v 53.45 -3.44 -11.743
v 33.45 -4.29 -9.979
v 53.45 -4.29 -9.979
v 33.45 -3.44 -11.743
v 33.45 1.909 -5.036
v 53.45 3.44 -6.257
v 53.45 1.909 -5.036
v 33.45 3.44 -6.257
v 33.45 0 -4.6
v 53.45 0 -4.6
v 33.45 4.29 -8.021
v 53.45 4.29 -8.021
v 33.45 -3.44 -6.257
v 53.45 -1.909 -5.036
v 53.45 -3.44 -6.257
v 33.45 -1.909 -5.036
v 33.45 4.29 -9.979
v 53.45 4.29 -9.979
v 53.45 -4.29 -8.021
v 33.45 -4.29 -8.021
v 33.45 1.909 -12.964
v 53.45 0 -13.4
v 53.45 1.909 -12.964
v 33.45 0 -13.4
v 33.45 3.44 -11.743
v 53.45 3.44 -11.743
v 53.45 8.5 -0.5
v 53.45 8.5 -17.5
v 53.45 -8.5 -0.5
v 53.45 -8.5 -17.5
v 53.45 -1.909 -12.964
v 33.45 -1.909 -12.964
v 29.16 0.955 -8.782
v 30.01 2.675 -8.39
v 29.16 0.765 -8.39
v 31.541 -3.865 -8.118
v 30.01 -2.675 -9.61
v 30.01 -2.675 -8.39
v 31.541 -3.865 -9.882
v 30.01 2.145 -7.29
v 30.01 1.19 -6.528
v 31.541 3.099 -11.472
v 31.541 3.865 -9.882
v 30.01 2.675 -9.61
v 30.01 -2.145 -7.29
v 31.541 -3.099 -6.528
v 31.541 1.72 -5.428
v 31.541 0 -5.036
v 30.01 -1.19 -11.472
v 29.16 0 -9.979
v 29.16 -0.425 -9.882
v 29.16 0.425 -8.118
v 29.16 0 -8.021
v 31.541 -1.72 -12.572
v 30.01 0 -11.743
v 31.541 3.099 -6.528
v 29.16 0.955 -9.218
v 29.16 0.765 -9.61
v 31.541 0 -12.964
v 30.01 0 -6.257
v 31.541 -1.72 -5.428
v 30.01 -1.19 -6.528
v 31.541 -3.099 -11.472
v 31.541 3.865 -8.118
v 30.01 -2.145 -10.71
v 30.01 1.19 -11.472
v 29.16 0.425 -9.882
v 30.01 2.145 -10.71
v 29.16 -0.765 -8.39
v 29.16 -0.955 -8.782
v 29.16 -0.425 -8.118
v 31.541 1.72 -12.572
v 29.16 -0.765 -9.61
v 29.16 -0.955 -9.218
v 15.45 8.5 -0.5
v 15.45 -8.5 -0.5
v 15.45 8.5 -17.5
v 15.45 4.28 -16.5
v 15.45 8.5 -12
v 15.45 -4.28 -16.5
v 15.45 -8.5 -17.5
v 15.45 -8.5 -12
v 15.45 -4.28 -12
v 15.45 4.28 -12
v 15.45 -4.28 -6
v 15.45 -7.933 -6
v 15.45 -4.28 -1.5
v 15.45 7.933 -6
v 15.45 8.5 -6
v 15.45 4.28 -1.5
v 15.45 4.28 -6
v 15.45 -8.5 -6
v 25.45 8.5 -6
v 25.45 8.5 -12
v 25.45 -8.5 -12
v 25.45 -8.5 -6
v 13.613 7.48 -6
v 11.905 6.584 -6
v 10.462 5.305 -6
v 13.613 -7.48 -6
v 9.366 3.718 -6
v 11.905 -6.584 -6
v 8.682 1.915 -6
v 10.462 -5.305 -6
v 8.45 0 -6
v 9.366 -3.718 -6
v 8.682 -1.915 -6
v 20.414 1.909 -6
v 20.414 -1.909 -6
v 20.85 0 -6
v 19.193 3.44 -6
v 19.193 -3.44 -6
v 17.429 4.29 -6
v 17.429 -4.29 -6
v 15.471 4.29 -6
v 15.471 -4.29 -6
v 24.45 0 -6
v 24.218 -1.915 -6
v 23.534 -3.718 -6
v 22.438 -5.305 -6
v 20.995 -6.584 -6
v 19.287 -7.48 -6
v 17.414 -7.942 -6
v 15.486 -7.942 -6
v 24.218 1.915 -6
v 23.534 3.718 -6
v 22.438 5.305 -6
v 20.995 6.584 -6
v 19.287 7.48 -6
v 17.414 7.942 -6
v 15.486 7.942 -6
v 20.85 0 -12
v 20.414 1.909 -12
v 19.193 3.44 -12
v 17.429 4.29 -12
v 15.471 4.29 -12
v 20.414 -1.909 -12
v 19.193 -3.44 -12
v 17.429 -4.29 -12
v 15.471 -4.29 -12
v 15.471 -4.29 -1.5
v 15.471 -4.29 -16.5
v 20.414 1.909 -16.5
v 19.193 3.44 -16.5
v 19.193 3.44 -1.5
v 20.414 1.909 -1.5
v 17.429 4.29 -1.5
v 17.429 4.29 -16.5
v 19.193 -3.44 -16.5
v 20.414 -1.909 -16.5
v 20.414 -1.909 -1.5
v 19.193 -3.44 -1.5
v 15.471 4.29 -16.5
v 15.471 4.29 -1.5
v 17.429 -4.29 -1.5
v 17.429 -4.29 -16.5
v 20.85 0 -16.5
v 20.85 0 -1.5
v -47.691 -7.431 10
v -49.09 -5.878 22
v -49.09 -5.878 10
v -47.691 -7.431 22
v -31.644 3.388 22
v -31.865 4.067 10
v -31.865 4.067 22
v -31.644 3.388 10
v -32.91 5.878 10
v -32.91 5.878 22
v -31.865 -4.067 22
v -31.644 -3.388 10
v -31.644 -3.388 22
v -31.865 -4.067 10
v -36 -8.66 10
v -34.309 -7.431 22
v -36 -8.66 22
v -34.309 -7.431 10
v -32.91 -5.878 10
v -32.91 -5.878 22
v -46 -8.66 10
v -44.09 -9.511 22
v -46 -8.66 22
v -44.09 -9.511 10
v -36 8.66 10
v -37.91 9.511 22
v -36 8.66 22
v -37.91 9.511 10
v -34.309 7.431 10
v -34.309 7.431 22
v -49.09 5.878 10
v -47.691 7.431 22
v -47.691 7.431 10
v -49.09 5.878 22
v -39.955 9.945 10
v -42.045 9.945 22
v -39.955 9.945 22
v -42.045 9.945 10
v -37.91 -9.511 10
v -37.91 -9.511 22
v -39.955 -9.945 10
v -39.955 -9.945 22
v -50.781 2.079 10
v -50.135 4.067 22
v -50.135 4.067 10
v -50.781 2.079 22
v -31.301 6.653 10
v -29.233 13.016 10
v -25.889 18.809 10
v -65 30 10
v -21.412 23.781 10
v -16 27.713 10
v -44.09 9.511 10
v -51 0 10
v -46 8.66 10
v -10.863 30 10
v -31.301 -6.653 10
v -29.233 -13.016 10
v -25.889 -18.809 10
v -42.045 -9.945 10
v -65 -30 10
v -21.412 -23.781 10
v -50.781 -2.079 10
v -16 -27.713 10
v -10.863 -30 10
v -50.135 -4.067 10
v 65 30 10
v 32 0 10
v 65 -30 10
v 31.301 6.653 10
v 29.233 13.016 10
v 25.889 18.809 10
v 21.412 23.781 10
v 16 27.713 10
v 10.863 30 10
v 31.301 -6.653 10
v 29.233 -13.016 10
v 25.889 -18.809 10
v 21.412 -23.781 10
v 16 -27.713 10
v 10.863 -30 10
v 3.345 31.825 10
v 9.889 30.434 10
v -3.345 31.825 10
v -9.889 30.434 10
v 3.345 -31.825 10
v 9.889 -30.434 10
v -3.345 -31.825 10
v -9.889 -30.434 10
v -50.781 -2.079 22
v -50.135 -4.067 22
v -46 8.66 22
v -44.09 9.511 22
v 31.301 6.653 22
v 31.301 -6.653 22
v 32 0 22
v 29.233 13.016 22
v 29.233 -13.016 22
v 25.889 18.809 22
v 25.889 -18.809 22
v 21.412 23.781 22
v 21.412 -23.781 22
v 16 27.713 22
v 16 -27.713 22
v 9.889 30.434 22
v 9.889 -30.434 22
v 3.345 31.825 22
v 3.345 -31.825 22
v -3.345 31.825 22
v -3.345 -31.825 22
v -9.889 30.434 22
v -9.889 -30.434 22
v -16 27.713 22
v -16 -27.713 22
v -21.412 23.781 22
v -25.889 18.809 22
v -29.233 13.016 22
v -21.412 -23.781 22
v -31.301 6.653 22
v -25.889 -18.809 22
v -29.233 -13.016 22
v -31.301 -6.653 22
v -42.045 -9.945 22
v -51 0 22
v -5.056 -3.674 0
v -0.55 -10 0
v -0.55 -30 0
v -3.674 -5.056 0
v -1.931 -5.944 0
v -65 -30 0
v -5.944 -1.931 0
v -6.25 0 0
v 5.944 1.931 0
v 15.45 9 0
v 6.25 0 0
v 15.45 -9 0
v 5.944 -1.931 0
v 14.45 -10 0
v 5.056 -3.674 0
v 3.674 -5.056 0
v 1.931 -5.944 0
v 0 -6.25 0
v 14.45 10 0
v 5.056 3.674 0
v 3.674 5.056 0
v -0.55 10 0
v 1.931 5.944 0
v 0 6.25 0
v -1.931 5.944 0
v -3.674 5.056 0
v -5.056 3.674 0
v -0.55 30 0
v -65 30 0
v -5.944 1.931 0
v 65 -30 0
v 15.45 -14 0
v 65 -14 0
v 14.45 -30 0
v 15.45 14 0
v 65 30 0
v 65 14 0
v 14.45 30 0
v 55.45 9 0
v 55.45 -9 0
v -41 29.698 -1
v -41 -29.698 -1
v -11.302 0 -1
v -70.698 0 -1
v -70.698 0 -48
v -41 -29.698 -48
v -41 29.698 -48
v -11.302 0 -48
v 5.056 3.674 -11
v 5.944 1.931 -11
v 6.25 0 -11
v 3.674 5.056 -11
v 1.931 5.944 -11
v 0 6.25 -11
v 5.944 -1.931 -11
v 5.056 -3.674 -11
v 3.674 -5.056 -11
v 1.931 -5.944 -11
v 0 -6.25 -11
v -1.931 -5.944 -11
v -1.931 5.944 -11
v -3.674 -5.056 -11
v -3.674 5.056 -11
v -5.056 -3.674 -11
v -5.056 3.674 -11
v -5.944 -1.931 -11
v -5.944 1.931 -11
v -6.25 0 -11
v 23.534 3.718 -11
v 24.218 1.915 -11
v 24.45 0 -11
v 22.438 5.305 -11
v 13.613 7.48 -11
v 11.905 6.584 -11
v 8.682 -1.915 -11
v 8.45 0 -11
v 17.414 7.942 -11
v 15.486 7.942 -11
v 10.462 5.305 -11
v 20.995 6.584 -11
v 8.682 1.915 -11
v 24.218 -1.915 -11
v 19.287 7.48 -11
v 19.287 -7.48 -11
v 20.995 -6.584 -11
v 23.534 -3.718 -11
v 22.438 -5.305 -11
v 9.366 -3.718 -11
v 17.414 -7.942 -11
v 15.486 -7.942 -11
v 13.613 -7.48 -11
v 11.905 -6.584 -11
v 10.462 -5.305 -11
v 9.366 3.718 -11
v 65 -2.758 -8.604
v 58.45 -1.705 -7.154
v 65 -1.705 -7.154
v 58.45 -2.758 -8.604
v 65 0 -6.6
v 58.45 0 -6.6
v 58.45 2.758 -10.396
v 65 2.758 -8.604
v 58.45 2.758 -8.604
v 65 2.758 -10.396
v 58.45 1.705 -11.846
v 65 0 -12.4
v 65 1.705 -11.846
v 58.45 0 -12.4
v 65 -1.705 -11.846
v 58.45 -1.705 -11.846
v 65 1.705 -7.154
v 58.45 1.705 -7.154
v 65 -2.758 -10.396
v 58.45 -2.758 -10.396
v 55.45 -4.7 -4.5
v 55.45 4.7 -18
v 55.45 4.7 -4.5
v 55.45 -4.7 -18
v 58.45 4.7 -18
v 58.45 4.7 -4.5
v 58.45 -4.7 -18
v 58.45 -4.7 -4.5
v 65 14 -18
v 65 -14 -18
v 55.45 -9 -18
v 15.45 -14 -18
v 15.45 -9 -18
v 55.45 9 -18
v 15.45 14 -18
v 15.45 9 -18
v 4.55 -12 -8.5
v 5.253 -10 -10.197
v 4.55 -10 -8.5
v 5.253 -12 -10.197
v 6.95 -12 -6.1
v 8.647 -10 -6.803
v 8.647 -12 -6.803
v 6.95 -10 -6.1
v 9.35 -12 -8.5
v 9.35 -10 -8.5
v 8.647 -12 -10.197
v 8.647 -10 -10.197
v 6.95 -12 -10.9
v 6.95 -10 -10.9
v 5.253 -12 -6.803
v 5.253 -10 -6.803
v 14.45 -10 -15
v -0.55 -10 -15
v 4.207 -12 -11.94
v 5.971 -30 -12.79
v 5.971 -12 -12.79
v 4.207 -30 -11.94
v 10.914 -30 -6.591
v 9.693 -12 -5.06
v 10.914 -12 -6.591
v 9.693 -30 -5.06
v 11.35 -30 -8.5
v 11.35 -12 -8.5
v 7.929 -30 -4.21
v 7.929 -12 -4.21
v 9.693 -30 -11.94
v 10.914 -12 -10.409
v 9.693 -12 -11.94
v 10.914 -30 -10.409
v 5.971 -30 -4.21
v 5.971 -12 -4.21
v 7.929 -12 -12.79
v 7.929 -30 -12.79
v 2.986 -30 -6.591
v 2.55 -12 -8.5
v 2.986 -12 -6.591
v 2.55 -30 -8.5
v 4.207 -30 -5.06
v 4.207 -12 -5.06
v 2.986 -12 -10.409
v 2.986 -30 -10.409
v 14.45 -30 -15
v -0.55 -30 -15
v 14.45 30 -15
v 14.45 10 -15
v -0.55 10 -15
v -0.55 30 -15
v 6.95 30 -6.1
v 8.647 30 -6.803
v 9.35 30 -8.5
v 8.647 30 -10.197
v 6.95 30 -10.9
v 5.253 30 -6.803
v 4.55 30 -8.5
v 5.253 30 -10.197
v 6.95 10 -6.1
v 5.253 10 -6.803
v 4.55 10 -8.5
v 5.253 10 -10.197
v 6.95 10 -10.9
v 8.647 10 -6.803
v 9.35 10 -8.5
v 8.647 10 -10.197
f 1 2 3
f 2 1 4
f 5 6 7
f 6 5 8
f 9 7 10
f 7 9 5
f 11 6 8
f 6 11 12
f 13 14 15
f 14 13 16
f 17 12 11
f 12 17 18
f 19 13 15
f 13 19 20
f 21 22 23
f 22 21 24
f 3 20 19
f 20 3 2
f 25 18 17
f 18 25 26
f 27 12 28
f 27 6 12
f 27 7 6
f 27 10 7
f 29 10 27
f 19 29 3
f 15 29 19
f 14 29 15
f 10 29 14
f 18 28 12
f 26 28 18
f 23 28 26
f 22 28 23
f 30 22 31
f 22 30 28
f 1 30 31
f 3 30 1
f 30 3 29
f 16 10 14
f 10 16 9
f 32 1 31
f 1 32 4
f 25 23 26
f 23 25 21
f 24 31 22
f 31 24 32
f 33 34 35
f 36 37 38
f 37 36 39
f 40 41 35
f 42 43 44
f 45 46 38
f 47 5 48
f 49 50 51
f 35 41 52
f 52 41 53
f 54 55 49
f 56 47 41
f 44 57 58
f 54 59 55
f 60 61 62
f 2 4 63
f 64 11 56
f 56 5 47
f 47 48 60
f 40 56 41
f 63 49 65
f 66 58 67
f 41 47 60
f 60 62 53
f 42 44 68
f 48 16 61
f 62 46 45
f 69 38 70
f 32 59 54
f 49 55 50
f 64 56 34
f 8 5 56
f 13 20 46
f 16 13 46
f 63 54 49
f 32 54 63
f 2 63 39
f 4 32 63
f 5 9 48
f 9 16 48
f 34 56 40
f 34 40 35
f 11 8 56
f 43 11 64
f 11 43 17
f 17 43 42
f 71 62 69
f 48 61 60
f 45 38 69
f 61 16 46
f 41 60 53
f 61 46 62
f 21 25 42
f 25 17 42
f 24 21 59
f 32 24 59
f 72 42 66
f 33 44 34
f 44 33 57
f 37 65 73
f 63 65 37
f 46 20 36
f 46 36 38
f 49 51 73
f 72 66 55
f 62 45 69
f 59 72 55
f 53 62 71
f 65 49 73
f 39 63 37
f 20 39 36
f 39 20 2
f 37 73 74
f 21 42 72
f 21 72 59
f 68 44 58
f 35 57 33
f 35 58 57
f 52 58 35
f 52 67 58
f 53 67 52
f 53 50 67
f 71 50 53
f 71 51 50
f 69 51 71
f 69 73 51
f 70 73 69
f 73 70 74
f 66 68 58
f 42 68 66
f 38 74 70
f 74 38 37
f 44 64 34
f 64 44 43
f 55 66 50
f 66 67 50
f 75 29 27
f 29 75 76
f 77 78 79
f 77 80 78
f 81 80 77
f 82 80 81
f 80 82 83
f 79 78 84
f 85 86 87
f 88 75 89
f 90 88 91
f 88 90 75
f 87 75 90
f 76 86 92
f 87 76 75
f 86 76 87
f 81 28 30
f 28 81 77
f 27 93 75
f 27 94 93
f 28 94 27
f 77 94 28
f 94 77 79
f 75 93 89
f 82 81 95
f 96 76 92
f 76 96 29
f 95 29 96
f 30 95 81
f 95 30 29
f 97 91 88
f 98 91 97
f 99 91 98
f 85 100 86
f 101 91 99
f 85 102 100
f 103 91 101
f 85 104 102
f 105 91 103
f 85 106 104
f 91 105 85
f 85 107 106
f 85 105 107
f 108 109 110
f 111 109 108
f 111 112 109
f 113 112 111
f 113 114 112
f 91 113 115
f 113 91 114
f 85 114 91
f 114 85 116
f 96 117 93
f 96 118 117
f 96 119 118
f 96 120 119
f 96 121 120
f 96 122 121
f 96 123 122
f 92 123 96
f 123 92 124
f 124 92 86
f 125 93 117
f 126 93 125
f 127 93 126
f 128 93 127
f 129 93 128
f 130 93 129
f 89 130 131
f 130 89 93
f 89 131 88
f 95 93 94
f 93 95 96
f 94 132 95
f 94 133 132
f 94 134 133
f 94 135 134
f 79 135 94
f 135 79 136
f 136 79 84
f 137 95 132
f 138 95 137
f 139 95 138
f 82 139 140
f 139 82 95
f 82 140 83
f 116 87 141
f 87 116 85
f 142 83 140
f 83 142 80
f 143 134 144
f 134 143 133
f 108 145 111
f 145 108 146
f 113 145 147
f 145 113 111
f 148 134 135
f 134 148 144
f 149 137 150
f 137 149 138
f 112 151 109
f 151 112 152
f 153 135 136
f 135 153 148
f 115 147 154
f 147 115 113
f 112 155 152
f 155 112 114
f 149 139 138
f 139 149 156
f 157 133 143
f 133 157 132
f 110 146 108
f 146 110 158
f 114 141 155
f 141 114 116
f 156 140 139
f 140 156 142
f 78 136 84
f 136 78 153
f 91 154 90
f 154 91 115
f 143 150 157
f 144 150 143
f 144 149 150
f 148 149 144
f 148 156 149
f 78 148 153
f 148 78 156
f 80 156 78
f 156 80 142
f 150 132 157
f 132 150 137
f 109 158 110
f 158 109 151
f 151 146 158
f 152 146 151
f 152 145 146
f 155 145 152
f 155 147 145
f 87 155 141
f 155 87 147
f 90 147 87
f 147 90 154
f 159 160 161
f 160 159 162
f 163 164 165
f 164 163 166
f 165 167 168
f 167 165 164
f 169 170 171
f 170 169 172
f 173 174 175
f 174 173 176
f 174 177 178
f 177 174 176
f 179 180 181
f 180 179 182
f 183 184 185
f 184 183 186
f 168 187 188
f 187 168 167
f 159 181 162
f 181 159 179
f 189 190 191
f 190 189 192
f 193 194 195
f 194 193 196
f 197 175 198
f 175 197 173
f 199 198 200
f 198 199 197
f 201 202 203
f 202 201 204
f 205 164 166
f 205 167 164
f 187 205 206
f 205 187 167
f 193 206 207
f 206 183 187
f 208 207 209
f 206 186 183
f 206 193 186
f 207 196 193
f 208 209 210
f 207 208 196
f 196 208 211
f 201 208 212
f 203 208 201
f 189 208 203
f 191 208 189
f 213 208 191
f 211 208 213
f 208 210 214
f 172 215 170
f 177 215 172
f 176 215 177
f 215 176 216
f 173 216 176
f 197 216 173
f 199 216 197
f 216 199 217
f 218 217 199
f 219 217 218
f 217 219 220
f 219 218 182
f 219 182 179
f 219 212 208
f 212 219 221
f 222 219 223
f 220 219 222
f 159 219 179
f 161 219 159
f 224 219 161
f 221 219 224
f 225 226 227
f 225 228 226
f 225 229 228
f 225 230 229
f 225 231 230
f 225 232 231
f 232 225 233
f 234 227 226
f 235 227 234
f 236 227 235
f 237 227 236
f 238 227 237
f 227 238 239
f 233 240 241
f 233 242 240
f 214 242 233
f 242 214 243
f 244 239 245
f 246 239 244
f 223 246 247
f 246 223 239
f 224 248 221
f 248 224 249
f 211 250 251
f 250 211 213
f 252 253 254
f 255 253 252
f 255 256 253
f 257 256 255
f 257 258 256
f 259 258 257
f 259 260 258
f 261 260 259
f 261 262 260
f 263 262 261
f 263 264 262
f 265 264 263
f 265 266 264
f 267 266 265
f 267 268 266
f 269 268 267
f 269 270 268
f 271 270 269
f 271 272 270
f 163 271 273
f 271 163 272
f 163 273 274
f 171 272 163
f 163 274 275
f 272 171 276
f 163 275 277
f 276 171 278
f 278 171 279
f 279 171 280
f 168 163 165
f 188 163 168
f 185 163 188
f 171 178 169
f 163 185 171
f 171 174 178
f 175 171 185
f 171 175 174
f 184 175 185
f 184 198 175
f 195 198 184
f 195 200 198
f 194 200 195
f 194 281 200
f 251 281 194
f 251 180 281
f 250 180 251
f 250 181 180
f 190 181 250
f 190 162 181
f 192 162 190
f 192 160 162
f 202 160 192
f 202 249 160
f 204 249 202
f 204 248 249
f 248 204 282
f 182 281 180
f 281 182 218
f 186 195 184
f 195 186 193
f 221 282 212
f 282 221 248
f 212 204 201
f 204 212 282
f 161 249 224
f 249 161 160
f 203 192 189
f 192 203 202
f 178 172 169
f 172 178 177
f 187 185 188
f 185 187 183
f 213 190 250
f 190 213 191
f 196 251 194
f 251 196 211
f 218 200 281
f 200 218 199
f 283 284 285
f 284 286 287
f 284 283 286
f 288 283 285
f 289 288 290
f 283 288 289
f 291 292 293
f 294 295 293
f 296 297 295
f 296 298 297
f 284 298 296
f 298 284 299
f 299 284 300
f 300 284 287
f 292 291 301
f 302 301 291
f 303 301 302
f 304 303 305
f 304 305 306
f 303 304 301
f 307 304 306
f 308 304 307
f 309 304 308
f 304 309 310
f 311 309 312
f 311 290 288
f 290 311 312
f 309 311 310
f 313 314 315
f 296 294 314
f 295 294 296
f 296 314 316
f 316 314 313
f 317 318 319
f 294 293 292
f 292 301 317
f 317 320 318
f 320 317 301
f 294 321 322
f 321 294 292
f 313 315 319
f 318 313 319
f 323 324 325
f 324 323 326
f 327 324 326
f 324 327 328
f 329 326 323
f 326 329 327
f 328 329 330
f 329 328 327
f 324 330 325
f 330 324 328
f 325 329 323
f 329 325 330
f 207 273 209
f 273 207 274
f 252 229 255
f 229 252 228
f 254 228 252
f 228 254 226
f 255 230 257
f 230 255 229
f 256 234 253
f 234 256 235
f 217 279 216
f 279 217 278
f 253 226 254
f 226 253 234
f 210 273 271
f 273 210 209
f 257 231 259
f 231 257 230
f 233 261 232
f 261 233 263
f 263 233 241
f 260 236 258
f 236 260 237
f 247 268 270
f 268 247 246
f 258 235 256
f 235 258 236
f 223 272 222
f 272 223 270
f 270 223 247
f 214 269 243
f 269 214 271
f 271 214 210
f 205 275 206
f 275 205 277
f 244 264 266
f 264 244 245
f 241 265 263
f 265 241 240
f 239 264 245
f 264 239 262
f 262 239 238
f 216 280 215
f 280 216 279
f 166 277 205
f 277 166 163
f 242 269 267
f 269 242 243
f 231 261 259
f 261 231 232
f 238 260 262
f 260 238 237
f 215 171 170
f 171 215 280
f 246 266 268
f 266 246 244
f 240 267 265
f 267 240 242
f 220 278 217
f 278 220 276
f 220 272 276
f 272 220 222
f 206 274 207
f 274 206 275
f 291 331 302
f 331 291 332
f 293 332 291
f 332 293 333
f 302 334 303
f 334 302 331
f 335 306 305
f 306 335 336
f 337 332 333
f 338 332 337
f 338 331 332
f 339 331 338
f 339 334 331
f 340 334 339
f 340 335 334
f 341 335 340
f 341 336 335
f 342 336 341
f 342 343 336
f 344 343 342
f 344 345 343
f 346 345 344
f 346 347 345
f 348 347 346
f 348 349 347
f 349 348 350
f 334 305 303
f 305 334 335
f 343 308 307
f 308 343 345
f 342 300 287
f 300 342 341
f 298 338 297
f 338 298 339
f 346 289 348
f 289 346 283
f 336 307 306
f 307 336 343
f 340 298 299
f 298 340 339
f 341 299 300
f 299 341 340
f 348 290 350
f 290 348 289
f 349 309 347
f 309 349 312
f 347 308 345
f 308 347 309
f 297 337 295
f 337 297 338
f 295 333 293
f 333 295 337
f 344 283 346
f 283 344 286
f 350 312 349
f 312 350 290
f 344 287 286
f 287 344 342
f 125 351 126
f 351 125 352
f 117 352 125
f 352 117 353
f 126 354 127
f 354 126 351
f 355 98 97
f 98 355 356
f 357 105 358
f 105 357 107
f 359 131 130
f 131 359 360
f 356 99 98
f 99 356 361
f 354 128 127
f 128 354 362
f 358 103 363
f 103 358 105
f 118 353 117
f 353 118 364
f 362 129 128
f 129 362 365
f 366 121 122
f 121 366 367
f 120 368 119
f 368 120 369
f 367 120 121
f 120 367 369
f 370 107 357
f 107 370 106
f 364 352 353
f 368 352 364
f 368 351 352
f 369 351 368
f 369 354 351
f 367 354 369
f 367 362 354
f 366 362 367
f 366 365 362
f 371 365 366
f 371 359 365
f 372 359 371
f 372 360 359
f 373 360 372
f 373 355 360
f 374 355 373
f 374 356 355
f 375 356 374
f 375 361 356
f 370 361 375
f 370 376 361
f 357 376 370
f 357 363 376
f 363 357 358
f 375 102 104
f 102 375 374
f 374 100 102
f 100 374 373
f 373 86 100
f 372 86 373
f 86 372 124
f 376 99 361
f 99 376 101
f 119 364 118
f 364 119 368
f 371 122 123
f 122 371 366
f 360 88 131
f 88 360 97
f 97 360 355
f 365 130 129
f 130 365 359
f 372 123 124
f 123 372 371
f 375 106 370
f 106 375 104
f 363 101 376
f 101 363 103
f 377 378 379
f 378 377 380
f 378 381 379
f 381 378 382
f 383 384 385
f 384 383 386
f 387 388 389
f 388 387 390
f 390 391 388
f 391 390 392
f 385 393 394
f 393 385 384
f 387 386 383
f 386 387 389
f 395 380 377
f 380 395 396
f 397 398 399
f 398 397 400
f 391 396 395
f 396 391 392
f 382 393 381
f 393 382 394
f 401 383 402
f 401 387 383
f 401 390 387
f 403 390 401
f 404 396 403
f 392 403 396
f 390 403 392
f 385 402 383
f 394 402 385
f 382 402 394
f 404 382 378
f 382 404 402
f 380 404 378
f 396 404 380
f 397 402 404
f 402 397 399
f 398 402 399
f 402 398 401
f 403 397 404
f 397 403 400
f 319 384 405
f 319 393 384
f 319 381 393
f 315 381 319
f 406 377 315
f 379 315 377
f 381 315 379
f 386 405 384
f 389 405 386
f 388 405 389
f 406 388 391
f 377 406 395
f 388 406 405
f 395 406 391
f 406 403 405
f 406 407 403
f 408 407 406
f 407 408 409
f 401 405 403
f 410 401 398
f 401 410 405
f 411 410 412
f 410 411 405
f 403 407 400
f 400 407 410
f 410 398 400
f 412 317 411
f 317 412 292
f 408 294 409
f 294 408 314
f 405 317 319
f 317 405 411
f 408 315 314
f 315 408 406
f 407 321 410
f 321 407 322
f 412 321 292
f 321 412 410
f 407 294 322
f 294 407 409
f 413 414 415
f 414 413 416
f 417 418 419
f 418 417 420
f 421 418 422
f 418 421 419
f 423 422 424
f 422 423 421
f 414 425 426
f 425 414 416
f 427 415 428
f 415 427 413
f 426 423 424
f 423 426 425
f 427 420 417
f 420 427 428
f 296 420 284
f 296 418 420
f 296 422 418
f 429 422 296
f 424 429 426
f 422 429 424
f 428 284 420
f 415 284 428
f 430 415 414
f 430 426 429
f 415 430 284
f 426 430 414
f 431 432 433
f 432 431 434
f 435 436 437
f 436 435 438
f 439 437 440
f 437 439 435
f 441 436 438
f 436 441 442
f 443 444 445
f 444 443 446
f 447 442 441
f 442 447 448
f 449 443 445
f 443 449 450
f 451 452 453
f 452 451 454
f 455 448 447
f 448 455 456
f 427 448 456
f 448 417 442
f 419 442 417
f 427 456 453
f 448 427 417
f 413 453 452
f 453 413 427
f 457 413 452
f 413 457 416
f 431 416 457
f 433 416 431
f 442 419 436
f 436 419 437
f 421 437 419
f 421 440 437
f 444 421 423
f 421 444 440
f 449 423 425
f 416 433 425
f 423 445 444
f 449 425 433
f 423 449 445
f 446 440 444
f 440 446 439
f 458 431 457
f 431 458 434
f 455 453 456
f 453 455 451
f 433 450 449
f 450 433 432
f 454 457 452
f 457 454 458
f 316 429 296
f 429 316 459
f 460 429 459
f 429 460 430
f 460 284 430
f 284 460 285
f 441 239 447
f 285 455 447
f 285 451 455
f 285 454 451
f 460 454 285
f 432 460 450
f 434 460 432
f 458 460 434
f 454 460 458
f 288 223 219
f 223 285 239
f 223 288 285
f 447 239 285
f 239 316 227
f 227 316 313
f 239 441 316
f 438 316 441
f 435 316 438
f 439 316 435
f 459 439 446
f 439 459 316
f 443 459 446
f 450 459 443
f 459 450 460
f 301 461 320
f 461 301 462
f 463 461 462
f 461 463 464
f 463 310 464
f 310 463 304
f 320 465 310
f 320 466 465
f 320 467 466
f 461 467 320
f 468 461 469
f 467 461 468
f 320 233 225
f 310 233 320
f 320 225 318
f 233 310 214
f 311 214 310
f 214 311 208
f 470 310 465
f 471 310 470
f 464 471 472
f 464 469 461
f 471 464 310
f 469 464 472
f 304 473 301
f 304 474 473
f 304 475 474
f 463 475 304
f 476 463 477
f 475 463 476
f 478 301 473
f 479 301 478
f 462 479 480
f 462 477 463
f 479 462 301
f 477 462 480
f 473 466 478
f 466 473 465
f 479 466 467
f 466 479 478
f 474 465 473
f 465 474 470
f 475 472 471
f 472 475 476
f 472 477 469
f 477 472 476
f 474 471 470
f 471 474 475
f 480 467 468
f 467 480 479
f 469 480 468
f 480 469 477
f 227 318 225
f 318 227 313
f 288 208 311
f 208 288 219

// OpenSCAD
//$fs = 1;
imp = 0.5;

sx = 17;
sy = 17;
sz = 38;
t = 0.4;

rz = 20;
rr = 8 / 2 + t;
axe_clip = 1;

mz = 10;
mx = 130;
my = 60;
roulement_offset = 14.7-6.25+8;
pression_offset = sz + roulement_offset - axe_clip;

module pression() {
	translate([0, 0, sz/2]) {
		difference() {
			cube([sx, sy, sz], true);
			translate([0, 0, (sz-10)/2]) cube([6, 20, 10], true);
			translate([0, 0, sz/2 - axe_clip]) rotate(90, [0, 1, 0]) {
				cylinder(sx-2, 4 + t, 4 + t, true);
			}
			translate([0, 0, -sz/2  + rz/2]) {
				cylinder(rz, rr, rr, true);
				translate([0, 0, rz/2]) sphere(rr, true);
			}
			//translate([sx/2, 0, 0]) cube([sx,sy,sz], true);
		}
	}
}

module meca() {
	color("Black", 0.5) {
		translate([0, 0, mz]) {
			cylinder(12, 32, 32);
			translate([0,0,-mz-11]) cylinder(11, 6.25, 6.25);
	
			translate([roulement_offset,0,-mz-11]) cylinder(5, 8, 8);
			
			translate([-41, 0, 0]) {
				cylinder(12, 10, 10);
				translate([0, 0, -10]) cylinder(10, 7.5, 7.5);		
				rotate(45, [0,0,1]) translate([0, 0, -10-47/2-1]) cube([42,42,47], true);
			}
		}
	}
}

rail_ep = 5;
rail_mg = 0.5;
rail_mg2 = 2;
ecrou_w = 9;
ecrou_d = 3;
ecrou_dia = 10;

rail_z = sx + 2*rail_mg;
rail_y = sy+2*(rail_ep+rail_mg);
rail_d = 12 - (roulement_offset - floor(roulement_offset));
rail_x = sz + rail_d;

module rail() {
	translate([-rail_x/2 + rail_d + pression_offset, 0, -rail_z/2]) {
		difference() {
			cube([rail_x, rail_y, rail_z], true);
			translate([-(rail_d-rail_mg2)/2,0,0]) {
				cube([rail_x-rail_d+rail_mg2, rail_y-2*rail_ep, rail_z], true);
			}
			translate([rail_x/2 - rail_d + rail_mg2, 0,-rail_mg]) {
				rotate(90, [0,1,0]) cylinder(rail_d-rail_mg2+imp, 2.5+t, 2.5+t);
				translate([ecrou_d/2,0,-rail_z/2+ecrou_dia/2]) cube([ecrou_d, ecrou_w + t, rail_z], true);
			}
		}
	}
}

guide_z = 15;
guide_w = 15;
guide_l = 20;
guide_r = 4 + t;
guide_r2 = 2 + t;
guide_offset = 14.7 - 6.25 - 3/2;

module guide() {
	translate([0, -my/2 + guide_l/2,0]) {
		difference() {
			translate([guide_offset, 0, -guide_z/2]) {
				cube([guide_w, guide_l, guide_z], true);
			}
			translate([guide_offset, 0, -11+2.5]) {
				rotate(90, [1,0,0]) {
					cylinder(guide_l, guide_r2, guide_r2, true);
					translate([0,0,2]) # cylinder(guide_l, guide_r, guide_r, true);
				}
			}
		}
	}
	translate([0, my/2 - guide_l/2,0]) {
		difference() {
			translate([guide_offset, 0, -guide_z/2]) {
				cube([guide_w, guide_l, guide_z], true);
			}
			translate([guide_offset, 0, -11+2.5]) {
				rotate(90, [1,0,0]) {
					cylinder(guide_l, guide_r2, guide_r2, true);
					//# cylinder(guide_l, guide_r, guide_r, true);
				}
			}
		}
	}

}

color("Red") translate([pression_offset, 0, -11+5/2 - rail_mg]) rotate(-90, [0,1,0]) pression();
meca();
rail();
guide();

translate([0, 0, mz/2]) {
	cube([mx, my, mz], true);		
}
